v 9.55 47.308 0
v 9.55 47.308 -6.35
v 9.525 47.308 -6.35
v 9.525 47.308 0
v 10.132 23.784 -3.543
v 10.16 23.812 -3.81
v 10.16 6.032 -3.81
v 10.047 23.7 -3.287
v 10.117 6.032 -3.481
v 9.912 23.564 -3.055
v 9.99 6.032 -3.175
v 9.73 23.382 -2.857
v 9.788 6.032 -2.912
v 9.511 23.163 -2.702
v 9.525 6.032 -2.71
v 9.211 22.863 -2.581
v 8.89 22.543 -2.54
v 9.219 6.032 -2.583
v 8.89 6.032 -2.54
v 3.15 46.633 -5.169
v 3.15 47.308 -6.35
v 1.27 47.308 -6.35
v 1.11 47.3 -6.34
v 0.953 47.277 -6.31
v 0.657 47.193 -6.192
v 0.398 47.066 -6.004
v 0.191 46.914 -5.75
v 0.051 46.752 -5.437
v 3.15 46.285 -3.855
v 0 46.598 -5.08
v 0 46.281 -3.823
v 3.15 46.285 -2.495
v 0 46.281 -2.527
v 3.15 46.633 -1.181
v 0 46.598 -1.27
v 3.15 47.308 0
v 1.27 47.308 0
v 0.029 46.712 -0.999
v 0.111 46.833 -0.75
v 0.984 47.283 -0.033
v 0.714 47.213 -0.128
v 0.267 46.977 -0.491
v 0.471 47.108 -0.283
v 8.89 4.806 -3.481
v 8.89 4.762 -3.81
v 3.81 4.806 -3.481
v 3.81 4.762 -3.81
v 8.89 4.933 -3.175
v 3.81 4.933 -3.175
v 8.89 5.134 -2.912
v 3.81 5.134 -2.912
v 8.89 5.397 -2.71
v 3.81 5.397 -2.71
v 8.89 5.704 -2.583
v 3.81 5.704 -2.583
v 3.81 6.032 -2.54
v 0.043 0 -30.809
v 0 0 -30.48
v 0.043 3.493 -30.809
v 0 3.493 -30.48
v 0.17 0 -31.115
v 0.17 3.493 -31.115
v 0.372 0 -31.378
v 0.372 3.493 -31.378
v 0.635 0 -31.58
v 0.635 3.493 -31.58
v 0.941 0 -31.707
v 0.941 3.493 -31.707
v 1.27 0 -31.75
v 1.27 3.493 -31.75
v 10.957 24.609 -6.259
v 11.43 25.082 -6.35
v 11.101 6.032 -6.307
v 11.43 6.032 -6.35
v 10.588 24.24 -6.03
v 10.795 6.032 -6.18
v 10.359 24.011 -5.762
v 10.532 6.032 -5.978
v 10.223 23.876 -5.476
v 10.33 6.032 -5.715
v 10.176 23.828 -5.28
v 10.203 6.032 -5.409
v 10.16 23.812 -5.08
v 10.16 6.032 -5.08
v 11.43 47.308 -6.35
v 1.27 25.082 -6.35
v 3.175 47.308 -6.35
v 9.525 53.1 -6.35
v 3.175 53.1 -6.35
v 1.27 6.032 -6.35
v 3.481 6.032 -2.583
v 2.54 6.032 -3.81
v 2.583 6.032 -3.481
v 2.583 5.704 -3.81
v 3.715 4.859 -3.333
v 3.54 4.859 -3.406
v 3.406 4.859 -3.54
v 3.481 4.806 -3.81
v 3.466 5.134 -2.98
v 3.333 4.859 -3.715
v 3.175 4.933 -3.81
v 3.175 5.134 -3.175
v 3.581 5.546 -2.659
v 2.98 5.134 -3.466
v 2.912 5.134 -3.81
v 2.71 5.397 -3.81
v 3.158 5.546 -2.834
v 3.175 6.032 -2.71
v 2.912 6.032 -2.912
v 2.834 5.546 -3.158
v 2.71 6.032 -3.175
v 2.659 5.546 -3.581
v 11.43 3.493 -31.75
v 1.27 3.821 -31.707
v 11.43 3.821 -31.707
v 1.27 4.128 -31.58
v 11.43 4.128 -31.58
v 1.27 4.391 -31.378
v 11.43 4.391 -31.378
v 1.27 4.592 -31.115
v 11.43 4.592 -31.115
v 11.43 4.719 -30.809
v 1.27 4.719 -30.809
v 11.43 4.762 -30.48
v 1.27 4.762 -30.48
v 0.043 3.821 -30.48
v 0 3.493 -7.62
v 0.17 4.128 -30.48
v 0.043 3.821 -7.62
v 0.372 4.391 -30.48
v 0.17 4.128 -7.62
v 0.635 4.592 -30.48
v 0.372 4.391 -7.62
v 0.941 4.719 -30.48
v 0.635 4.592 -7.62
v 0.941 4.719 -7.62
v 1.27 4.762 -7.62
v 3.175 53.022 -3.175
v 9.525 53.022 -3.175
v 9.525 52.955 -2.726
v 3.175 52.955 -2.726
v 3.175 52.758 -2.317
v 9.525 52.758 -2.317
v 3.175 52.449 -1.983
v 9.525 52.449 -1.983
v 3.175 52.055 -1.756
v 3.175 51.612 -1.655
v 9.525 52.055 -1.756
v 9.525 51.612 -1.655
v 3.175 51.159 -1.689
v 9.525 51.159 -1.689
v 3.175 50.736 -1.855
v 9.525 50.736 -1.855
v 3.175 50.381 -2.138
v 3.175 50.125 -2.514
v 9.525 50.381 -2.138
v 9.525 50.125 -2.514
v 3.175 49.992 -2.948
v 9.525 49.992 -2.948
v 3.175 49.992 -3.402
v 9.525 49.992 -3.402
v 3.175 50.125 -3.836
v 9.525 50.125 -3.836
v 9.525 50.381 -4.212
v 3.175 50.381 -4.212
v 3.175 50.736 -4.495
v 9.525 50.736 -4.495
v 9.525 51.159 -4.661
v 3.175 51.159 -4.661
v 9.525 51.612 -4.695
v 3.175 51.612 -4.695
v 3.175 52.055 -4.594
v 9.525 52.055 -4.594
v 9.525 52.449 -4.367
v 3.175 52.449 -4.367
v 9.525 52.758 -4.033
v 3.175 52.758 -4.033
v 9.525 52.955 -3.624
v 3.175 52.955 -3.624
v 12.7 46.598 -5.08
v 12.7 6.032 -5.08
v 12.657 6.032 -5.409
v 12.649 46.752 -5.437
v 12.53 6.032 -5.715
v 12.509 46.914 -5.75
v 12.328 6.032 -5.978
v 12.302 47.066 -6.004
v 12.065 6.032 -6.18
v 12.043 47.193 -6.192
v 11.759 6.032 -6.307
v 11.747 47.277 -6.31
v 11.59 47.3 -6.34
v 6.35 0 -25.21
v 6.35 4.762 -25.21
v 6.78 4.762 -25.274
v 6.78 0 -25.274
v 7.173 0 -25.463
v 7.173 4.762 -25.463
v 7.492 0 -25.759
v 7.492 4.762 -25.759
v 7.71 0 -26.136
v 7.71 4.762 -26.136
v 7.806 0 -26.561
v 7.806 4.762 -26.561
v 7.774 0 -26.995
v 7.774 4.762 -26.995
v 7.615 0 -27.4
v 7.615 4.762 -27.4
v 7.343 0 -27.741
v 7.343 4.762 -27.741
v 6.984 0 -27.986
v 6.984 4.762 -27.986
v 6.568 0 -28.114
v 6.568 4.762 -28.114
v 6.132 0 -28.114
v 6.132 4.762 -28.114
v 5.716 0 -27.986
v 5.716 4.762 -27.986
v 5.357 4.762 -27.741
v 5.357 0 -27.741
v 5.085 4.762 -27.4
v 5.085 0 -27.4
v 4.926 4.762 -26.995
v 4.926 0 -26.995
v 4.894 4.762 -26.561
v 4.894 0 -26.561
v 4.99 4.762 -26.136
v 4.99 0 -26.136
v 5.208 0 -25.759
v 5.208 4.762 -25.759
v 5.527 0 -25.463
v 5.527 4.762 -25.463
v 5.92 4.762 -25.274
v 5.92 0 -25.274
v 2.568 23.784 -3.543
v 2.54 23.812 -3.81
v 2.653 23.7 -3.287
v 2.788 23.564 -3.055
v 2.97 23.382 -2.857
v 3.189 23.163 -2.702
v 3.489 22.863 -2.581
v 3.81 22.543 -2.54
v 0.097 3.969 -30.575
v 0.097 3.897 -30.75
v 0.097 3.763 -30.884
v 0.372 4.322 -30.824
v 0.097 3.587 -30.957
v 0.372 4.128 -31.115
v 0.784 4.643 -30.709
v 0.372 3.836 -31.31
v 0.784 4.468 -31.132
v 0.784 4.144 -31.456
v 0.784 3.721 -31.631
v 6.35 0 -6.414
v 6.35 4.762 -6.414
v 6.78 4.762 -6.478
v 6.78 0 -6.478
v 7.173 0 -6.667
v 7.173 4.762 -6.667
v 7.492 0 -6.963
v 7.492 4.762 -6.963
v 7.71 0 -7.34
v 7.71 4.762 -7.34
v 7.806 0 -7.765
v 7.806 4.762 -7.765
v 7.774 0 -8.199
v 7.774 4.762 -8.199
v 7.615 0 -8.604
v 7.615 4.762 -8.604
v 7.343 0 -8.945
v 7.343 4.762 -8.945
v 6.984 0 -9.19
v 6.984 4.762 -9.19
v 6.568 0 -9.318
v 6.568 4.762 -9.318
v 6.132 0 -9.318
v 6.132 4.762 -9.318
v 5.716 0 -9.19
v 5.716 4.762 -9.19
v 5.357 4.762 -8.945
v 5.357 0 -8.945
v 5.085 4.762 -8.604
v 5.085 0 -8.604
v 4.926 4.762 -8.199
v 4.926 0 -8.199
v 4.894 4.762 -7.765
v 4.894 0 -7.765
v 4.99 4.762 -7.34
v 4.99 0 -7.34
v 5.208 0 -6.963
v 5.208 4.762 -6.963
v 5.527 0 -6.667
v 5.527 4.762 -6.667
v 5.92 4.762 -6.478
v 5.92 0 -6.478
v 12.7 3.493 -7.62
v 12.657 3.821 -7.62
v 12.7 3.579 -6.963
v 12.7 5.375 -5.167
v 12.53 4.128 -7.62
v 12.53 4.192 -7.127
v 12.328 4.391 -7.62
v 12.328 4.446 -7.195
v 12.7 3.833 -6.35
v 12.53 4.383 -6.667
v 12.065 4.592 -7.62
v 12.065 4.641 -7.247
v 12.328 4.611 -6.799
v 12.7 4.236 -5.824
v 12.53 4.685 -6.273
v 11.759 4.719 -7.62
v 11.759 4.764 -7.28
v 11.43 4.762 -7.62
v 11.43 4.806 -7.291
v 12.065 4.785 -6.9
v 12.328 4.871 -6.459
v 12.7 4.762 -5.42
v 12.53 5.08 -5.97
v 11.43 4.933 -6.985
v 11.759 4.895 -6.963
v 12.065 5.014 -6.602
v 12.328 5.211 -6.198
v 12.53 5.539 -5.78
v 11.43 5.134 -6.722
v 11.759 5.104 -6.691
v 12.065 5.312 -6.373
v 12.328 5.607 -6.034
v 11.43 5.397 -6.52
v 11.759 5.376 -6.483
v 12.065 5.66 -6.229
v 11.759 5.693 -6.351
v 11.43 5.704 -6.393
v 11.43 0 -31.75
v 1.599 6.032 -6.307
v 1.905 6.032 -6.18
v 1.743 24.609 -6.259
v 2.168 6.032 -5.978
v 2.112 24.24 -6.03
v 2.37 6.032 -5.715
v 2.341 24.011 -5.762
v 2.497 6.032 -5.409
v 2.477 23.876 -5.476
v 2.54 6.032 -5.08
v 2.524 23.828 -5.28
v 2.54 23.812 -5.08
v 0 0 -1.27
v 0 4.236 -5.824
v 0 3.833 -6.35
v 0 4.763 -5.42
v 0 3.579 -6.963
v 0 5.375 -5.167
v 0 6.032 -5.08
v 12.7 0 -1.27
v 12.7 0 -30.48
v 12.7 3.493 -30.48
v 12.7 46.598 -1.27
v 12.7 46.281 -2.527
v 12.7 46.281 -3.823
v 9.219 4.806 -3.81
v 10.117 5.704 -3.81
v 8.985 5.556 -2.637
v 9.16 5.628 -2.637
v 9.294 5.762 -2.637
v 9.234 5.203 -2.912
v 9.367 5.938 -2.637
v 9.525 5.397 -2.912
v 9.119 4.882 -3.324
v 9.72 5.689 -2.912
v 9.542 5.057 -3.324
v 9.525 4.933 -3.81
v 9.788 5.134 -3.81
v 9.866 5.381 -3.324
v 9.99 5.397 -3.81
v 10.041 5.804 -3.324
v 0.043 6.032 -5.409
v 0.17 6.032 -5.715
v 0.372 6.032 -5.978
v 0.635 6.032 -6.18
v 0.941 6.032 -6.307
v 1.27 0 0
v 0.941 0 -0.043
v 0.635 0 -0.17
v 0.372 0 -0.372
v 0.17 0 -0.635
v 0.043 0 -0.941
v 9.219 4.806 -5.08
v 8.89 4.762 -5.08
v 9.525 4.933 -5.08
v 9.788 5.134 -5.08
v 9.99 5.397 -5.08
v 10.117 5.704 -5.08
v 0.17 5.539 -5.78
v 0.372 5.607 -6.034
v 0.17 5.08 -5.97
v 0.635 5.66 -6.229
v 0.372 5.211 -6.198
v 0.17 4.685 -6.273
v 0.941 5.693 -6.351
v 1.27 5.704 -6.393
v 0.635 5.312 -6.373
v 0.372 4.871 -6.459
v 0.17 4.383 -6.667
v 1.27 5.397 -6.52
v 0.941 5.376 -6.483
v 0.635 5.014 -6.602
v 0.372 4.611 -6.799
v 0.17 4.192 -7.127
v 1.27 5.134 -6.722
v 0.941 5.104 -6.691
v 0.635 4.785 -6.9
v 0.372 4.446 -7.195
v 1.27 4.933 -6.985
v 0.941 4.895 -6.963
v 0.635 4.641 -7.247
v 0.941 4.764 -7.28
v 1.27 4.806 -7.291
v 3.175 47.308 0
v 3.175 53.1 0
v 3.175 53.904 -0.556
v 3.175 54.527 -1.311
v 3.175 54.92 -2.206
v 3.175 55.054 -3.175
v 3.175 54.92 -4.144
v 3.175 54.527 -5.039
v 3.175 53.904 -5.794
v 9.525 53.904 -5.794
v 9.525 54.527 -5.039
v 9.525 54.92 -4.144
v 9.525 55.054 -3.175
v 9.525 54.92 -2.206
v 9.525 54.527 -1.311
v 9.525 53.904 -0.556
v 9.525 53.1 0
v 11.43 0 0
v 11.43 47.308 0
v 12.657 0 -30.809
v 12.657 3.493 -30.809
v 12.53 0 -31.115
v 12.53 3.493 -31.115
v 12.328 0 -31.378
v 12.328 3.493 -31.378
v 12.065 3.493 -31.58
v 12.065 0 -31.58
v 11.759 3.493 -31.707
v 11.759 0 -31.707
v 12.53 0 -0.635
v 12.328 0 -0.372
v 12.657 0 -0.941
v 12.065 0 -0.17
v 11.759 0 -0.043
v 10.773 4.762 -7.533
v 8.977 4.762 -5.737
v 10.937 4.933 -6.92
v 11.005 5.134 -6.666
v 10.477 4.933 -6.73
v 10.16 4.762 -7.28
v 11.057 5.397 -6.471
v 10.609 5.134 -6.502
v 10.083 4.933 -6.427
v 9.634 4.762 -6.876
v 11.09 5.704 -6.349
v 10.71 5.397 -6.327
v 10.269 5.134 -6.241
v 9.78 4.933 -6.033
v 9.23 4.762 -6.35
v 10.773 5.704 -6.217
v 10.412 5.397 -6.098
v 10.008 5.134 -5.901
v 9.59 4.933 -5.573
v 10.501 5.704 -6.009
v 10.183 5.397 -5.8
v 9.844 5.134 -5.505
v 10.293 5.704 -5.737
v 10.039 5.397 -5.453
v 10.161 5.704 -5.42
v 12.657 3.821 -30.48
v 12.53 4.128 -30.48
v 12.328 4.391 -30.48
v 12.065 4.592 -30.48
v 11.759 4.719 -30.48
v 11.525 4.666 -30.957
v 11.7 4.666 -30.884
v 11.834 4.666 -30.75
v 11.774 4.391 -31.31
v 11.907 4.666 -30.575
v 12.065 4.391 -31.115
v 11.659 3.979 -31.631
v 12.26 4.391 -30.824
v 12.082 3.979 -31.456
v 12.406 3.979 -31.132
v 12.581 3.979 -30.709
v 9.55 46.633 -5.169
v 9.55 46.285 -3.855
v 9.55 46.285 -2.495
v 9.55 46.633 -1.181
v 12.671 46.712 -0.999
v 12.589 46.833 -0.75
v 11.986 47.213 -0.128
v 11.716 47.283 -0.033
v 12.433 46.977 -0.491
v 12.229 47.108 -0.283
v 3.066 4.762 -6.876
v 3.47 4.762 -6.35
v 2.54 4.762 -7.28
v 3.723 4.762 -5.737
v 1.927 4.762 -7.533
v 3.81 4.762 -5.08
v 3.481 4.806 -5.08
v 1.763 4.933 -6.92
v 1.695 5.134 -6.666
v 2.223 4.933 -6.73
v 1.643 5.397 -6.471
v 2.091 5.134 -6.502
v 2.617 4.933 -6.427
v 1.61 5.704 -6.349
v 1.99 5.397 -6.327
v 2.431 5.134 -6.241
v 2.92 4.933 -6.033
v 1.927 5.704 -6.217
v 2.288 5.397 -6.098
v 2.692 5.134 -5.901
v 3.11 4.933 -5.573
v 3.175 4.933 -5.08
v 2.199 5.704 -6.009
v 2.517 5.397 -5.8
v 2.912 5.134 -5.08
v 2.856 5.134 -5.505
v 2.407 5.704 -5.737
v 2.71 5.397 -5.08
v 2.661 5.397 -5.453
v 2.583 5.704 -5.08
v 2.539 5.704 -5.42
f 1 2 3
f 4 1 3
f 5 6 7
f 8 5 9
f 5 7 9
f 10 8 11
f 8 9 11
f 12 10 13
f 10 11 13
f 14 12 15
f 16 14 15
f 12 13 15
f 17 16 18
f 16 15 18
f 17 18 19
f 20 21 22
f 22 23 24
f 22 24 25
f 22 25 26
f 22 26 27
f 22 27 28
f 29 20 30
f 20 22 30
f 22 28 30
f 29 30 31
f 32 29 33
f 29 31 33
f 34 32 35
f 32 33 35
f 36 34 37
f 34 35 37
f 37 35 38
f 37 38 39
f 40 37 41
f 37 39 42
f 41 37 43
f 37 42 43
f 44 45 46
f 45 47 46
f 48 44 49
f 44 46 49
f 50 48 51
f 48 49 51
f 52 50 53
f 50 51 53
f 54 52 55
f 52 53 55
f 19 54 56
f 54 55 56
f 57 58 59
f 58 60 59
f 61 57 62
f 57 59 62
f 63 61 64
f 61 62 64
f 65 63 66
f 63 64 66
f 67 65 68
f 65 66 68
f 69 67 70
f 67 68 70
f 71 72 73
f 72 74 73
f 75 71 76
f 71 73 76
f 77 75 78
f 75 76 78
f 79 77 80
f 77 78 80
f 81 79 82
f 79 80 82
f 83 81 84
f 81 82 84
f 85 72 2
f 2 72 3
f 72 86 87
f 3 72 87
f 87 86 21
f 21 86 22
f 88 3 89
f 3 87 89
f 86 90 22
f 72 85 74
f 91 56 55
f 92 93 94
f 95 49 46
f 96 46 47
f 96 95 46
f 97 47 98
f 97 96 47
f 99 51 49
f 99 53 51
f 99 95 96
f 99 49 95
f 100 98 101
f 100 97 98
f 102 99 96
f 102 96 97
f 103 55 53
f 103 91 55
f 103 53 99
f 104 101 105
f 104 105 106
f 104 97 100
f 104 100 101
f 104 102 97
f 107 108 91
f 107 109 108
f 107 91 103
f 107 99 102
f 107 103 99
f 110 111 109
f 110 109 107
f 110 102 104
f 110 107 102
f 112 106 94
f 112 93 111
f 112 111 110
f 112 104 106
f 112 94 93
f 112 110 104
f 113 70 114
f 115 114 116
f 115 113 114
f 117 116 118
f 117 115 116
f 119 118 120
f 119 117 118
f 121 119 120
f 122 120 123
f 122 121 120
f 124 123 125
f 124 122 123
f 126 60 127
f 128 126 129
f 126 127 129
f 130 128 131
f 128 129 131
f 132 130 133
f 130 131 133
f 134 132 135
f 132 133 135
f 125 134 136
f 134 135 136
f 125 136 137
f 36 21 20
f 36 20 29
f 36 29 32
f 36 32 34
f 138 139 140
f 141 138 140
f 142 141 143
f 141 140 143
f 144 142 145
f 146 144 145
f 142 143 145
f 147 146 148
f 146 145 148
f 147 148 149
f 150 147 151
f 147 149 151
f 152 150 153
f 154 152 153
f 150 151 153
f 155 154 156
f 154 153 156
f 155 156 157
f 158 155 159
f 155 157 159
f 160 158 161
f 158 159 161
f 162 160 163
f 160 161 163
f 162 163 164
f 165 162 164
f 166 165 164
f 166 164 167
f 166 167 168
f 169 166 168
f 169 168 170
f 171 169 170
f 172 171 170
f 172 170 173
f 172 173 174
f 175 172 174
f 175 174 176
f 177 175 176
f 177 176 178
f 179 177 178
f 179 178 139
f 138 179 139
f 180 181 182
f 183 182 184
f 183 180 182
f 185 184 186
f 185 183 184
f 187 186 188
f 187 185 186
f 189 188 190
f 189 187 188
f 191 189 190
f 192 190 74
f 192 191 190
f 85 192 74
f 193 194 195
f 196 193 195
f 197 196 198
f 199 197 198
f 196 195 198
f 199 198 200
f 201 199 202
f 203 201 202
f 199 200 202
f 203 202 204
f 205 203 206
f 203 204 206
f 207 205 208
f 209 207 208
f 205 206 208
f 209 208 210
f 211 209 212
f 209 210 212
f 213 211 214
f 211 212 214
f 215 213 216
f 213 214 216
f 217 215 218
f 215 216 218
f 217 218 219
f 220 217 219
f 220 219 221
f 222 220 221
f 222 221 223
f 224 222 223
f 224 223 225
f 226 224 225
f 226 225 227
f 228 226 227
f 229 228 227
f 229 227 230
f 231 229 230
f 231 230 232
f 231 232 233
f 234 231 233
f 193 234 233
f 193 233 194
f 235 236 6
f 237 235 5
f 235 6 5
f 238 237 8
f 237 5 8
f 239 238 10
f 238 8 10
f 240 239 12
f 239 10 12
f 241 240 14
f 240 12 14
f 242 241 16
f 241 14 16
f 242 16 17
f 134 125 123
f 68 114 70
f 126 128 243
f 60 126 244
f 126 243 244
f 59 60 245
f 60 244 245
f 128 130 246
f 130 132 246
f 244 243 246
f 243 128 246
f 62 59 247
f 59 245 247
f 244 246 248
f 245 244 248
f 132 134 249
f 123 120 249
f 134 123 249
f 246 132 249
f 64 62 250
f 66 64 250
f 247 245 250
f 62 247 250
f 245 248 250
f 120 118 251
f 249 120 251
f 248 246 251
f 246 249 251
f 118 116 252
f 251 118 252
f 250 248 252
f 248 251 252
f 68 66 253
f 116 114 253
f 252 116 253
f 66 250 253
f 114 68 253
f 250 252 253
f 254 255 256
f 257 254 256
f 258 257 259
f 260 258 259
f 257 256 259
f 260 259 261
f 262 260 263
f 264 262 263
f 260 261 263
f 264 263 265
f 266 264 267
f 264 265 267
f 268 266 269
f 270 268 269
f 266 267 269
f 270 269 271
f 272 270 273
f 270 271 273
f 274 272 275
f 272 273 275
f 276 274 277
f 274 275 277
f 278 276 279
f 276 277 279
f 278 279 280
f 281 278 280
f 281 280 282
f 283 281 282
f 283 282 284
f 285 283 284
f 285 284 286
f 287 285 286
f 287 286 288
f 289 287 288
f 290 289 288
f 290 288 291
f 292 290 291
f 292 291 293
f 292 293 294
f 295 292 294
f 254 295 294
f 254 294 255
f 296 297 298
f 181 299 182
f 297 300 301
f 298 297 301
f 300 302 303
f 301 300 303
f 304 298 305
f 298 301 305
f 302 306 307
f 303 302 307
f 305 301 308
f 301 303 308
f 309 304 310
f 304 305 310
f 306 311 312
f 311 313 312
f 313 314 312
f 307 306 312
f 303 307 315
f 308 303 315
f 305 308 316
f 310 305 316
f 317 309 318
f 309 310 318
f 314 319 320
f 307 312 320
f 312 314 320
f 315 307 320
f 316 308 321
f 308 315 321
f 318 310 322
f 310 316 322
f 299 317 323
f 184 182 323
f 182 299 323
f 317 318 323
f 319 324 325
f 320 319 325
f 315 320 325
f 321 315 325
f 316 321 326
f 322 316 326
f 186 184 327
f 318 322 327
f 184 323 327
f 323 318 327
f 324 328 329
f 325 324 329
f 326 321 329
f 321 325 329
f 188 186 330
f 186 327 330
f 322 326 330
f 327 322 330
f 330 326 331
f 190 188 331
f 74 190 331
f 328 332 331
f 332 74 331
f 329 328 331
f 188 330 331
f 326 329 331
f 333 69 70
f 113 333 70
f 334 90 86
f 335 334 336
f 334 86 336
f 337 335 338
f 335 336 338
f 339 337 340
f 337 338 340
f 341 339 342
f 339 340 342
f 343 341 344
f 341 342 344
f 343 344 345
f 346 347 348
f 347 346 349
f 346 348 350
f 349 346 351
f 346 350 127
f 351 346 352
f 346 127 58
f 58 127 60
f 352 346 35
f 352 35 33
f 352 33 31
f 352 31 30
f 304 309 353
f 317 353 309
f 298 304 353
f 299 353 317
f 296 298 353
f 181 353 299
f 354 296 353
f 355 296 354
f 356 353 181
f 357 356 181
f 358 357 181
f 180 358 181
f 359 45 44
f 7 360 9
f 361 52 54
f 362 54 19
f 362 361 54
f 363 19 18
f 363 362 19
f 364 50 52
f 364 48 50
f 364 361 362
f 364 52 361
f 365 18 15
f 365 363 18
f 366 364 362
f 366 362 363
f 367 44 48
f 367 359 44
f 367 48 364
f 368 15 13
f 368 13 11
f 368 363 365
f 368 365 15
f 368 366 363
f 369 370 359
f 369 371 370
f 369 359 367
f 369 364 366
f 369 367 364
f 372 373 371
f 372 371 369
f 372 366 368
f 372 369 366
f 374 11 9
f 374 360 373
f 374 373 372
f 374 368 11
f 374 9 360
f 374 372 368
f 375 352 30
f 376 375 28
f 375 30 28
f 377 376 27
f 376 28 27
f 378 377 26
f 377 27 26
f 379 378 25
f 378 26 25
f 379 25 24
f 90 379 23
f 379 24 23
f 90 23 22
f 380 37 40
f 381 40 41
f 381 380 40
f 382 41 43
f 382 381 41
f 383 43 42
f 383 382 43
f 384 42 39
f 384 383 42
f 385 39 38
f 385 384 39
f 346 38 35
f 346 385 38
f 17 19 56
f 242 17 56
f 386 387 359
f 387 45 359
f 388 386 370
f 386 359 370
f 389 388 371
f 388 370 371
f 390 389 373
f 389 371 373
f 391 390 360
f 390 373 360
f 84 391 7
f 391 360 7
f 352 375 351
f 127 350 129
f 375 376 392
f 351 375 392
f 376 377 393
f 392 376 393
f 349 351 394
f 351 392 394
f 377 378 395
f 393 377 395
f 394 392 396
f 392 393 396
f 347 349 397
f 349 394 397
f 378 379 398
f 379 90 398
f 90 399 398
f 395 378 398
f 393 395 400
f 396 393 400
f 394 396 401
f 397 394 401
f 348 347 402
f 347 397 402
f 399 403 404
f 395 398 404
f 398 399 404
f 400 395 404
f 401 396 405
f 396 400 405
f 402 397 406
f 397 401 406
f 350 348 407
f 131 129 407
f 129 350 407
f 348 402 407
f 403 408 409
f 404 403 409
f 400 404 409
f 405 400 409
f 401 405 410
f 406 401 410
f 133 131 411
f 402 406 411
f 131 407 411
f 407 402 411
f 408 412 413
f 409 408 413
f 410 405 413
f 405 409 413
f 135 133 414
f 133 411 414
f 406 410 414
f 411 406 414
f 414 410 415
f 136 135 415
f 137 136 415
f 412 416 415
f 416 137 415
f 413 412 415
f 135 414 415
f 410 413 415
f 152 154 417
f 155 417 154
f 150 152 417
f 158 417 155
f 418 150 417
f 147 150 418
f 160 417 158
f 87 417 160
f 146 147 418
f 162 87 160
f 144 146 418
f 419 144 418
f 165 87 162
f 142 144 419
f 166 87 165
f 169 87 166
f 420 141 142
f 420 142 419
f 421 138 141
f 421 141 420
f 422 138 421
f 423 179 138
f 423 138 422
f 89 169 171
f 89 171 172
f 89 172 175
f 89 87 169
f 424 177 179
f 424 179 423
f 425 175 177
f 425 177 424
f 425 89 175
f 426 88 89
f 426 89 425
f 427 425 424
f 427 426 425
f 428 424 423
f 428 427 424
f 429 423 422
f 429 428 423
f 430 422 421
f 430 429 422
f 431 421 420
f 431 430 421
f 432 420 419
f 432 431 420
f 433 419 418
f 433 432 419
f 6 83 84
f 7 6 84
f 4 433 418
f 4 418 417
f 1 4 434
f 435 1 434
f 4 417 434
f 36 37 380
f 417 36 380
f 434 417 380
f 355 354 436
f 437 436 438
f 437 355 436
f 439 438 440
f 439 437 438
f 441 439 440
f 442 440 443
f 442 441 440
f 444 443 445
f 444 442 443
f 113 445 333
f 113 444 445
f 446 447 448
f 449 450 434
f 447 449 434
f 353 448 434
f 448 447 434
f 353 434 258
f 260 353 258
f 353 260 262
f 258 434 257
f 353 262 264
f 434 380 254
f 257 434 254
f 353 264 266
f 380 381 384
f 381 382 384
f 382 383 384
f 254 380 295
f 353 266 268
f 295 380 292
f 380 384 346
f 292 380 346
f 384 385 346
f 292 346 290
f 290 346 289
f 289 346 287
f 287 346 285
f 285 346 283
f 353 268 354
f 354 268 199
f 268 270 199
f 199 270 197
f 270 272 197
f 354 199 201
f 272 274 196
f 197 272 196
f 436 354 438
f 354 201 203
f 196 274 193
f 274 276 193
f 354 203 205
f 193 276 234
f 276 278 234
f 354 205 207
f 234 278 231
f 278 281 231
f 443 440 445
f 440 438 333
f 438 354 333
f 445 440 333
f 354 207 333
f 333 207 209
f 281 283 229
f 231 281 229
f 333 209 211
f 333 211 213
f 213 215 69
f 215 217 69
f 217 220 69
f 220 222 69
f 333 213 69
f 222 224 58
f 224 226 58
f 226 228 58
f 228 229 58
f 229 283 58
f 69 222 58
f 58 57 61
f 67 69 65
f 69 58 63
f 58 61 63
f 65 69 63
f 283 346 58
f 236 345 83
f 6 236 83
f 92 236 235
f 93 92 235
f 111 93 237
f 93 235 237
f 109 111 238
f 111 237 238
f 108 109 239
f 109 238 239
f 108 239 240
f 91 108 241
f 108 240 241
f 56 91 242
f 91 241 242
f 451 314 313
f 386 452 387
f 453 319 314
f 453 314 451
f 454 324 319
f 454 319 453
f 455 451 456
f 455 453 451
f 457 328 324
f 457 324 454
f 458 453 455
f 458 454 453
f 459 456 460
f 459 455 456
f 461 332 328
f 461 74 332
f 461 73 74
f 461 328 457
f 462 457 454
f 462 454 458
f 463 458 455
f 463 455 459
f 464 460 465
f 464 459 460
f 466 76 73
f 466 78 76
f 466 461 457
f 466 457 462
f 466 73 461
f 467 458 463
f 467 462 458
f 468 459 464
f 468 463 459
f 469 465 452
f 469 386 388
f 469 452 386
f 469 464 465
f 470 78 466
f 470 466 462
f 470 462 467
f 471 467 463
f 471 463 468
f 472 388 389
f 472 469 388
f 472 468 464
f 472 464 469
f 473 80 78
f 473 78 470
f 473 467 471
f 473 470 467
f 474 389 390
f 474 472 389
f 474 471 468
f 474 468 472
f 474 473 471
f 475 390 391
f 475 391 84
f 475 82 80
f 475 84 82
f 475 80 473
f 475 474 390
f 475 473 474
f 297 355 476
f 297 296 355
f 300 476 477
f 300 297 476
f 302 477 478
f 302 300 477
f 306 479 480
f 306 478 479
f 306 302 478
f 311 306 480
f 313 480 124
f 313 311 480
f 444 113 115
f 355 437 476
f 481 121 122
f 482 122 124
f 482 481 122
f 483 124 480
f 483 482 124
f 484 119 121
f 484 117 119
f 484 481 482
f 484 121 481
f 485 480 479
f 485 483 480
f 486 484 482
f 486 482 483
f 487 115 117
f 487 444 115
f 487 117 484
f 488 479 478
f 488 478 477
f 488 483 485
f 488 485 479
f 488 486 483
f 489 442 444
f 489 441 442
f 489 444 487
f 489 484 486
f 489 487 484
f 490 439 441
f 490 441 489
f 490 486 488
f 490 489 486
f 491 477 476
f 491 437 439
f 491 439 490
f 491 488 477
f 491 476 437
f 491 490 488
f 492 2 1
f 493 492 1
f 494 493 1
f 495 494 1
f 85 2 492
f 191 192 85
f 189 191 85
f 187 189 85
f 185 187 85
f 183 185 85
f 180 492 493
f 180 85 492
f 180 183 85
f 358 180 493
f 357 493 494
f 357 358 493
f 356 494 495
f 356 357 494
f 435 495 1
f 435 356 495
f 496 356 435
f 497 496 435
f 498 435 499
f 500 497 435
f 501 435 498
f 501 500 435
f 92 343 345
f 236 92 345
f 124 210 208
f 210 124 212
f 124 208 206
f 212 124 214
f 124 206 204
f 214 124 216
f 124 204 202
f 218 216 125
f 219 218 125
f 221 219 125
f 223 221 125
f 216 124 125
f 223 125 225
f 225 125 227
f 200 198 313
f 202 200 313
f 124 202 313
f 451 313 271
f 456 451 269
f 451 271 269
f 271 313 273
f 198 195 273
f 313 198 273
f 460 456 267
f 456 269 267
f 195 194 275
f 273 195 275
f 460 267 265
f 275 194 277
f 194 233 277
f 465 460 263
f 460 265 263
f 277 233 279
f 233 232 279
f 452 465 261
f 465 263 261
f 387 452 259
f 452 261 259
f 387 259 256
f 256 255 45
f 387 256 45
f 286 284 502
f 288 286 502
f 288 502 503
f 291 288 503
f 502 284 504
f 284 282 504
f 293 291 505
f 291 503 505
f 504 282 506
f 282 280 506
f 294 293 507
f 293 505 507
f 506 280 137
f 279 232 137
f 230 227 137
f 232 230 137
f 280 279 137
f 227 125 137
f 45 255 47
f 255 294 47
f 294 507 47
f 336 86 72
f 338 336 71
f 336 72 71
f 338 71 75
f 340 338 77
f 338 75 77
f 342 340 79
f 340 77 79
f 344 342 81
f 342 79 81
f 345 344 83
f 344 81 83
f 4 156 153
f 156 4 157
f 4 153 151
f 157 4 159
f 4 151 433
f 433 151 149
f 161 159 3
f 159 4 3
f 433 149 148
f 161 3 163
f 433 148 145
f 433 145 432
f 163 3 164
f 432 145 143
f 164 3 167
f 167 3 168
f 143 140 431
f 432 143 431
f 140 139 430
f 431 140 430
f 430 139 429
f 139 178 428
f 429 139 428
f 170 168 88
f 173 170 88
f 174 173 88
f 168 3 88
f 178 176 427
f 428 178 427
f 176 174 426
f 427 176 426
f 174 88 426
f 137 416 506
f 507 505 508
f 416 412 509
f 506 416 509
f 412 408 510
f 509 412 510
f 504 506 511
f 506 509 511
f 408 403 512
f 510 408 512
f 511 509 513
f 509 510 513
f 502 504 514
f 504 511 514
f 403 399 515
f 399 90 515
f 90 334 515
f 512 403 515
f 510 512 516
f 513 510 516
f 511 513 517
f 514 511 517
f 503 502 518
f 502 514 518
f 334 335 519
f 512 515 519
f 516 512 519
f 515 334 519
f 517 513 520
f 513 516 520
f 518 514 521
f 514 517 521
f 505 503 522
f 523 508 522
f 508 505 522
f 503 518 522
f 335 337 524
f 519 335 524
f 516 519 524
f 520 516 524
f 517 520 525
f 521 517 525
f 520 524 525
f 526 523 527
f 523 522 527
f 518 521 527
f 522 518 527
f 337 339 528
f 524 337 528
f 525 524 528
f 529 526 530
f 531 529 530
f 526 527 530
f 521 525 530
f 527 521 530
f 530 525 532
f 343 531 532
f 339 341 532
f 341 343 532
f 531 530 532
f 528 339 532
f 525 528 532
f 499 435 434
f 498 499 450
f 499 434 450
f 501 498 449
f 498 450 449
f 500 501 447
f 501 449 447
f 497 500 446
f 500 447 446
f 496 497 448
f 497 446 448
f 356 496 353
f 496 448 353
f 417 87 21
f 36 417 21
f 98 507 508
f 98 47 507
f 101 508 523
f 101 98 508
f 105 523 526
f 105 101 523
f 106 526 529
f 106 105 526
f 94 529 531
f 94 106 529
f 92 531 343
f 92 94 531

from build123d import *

# Parameters (mm, degrees)
BOSS_EXTRUDE1_DEPTH = 12.7
SKETCH4_R           = 1.4605
CUT_EXTRUDE1_DEPTH  = 62.237182332
SKETCH7_W           = 3.175
SKETCH7_H           = 8.255
CUT_EXTRUDE3_DEPTH  = 63.399049722
SKETCH8_R           = 1.524
CUT_EXTRUDE4_DEPTH  = 12.7
CUT_EXTRUDE5_DEPTH  = 3.1496
CUT_EXTRUDE6_DEPTH  = 65.699146295
CUT_EXTRUDE7_DEPTH  = 3.81
FILLET2_R           = 1.27


with BuildPart() as part:
    # Sketch3 → Boss-Extrude1 (new body)
    with BuildSketch(Plane(origin=(0, 0, 0), x_dir=(0, 0, -1), z_dir=(1, 0, 0))):
        Polygon((0, 0), (31.75, 0), (31.75, 4.7625), (6.35, 4.7625), (6.35, 55.5625), (0, 55.5625), align=None)
    extrude(amount=BOSS_EXTRUDE1_DEPTH)

    # Sketch4 → Cut-Extrude1 (cut, through all)
    with BuildSketch(Plane(origin=(0, 4.7625, 0), x_dir=(1, 0, 0), z_dir=(0, 1, 0))):
        with Locations(Location((6.35, 26.67, 0), (0, 0, 270))):
            Circle(SKETCH4_R)
        with Locations(Location((6.35, 7.874, 0), (0, 0, 270))):
            Circle(SKETCH4_R)
    extrude(amount=-CUT_EXTRUDE1_DEPTH, mode=Mode.SUBTRACT)

    # Sketch7 → Cut-Extrude3 (cut, through all)
    with BuildSketch(Plane(origin=(0, 0, -6.35), x_dir=(-1, 0, 0), z_dir=(0, 0, -1))):
        with Locations((-11.1125, 51.435)):
            Rectangle(SKETCH7_W, SKETCH7_H)
        with Locations((-1.5875, 51.435)):
            Rectangle(SKETCH7_W, SKETCH7_H)
    extrude(amount=-CUT_EXTRUDE3_DEPTH, mode=Mode.SUBTRACT)

    # Sketch8 → Cut-Extrude4 (cut)
    with BuildSketch(Plane(origin=(9.525, 0, 0), x_dir=(0, 0, -1), z_dir=(1, 0, 0))):
        with Locations(Location((3.175, 51.4985, 0), (0, 0, 90))):
            Circle(SKETCH8_R)
    extrude(amount=-CUT_EXTRUDE4_DEPTH, mode=Mode.SUBTRACT)

    # Sketch9 → Cut-Extrude5 (cut)
    with BuildSketch(Plane(origin=(12.7, 0, 0), x_dir=(0, 0, -1), z_dir=(1, 0, 0))):
        with BuildLine():
            Line((0, 47.3075), (6.35, 47.3075))
            ThreePointArc((6.35, 47.3075), (3.175, 46.240638648), (0, 47.3075))
        make_face()
    cut_extrude5 = extrude(amount=-CUT_EXTRUDE5_DEPTH, mode=Mode.SUBTRACT)

    # Mirror1: Cut-Extrude5 across plane
    add(cut_extrude5.mirror(Plane(origin=(6.35, 0, 0), x_dir=(0, 0, 1), z_dir=(1, 0, 0))), mode=Mode.SUBTRACT)

    # Sketch10 → Cut-Extrude6 (cut, through all)
    with BuildSketch(Plane(origin=(9.525, 0, 0), x_dir=(0, 0, -1), z_dir=(1, 0, 0))):
        with BuildLine():
            Line((0, 53.099909067), (0, 55.639909067))
            Line((0, 55.639909067), (6.35, 55.639909067))
            Line((6.35, 55.639909067), (6.35, 53.099909067))
            ThreePointArc((6.35, 53.099909067), (3.175, 55.0545), (0, 53.099909067))
        make_face()
    extrude(amount=-CUT_EXTRUDE6_DEPTH, mode=Mode.SUBTRACT)

    # Sketch11 → Cut-Extrude7 (cut)
    with BuildSketch(Plane(origin=(0, 0, -6.35), x_dir=(-1, 0, 0), z_dir=(0, 0, -1))):
        Polygon((-6.35, 23.8125), (-10.16, 23.8125), (-10.16, 4.7625), (-2.54, 4.7625), (-2.54, 23.8125), align=None)
    extrude(amount=-CUT_EXTRUDE7_DEPTH, mode=Mode.SUBTRACT)

    # Fillet2
    fillet2_edges = [part.edges().sort_by_distance(p)[0] for p in [
        (12.7, 2.38125, -31.75),
        (10.16, 4.7625, -4.445),
        (6.35, 23.8125, -2.54),
        (2.54, 14.2875, -6.35),
        (6.35, 23.8125, -6.35),
        (10.16, 14.2875, -6.35),
        (11.43, 4.7625, -6.35),
        (6.35, 4.7625, -31.75),
        (12.7, 4.7625, -19.05),
        (12.7, 26.035, -6.35),
        (12.7, 23.65375, 0),
        (0, 23.65375, 0),
        (0, 26.035, -6.35),
        (0, 4.7625, -19.05),
        (0, 2.38125, -31.75),
        (1.27, 4.7625, -6.35),
        (2.54, 14.2875, -2.54),
        (6.35, 4.7625, -2.54),
        (2.54, 4.7625, -4.445),
        (10.16, 14.2875, -2.54),
    ]]
    fillet(fillet2_edges, radius=FILLET2_R - 0.0001)  # a hair under: the kernel refuses the full size


solid = part.part
